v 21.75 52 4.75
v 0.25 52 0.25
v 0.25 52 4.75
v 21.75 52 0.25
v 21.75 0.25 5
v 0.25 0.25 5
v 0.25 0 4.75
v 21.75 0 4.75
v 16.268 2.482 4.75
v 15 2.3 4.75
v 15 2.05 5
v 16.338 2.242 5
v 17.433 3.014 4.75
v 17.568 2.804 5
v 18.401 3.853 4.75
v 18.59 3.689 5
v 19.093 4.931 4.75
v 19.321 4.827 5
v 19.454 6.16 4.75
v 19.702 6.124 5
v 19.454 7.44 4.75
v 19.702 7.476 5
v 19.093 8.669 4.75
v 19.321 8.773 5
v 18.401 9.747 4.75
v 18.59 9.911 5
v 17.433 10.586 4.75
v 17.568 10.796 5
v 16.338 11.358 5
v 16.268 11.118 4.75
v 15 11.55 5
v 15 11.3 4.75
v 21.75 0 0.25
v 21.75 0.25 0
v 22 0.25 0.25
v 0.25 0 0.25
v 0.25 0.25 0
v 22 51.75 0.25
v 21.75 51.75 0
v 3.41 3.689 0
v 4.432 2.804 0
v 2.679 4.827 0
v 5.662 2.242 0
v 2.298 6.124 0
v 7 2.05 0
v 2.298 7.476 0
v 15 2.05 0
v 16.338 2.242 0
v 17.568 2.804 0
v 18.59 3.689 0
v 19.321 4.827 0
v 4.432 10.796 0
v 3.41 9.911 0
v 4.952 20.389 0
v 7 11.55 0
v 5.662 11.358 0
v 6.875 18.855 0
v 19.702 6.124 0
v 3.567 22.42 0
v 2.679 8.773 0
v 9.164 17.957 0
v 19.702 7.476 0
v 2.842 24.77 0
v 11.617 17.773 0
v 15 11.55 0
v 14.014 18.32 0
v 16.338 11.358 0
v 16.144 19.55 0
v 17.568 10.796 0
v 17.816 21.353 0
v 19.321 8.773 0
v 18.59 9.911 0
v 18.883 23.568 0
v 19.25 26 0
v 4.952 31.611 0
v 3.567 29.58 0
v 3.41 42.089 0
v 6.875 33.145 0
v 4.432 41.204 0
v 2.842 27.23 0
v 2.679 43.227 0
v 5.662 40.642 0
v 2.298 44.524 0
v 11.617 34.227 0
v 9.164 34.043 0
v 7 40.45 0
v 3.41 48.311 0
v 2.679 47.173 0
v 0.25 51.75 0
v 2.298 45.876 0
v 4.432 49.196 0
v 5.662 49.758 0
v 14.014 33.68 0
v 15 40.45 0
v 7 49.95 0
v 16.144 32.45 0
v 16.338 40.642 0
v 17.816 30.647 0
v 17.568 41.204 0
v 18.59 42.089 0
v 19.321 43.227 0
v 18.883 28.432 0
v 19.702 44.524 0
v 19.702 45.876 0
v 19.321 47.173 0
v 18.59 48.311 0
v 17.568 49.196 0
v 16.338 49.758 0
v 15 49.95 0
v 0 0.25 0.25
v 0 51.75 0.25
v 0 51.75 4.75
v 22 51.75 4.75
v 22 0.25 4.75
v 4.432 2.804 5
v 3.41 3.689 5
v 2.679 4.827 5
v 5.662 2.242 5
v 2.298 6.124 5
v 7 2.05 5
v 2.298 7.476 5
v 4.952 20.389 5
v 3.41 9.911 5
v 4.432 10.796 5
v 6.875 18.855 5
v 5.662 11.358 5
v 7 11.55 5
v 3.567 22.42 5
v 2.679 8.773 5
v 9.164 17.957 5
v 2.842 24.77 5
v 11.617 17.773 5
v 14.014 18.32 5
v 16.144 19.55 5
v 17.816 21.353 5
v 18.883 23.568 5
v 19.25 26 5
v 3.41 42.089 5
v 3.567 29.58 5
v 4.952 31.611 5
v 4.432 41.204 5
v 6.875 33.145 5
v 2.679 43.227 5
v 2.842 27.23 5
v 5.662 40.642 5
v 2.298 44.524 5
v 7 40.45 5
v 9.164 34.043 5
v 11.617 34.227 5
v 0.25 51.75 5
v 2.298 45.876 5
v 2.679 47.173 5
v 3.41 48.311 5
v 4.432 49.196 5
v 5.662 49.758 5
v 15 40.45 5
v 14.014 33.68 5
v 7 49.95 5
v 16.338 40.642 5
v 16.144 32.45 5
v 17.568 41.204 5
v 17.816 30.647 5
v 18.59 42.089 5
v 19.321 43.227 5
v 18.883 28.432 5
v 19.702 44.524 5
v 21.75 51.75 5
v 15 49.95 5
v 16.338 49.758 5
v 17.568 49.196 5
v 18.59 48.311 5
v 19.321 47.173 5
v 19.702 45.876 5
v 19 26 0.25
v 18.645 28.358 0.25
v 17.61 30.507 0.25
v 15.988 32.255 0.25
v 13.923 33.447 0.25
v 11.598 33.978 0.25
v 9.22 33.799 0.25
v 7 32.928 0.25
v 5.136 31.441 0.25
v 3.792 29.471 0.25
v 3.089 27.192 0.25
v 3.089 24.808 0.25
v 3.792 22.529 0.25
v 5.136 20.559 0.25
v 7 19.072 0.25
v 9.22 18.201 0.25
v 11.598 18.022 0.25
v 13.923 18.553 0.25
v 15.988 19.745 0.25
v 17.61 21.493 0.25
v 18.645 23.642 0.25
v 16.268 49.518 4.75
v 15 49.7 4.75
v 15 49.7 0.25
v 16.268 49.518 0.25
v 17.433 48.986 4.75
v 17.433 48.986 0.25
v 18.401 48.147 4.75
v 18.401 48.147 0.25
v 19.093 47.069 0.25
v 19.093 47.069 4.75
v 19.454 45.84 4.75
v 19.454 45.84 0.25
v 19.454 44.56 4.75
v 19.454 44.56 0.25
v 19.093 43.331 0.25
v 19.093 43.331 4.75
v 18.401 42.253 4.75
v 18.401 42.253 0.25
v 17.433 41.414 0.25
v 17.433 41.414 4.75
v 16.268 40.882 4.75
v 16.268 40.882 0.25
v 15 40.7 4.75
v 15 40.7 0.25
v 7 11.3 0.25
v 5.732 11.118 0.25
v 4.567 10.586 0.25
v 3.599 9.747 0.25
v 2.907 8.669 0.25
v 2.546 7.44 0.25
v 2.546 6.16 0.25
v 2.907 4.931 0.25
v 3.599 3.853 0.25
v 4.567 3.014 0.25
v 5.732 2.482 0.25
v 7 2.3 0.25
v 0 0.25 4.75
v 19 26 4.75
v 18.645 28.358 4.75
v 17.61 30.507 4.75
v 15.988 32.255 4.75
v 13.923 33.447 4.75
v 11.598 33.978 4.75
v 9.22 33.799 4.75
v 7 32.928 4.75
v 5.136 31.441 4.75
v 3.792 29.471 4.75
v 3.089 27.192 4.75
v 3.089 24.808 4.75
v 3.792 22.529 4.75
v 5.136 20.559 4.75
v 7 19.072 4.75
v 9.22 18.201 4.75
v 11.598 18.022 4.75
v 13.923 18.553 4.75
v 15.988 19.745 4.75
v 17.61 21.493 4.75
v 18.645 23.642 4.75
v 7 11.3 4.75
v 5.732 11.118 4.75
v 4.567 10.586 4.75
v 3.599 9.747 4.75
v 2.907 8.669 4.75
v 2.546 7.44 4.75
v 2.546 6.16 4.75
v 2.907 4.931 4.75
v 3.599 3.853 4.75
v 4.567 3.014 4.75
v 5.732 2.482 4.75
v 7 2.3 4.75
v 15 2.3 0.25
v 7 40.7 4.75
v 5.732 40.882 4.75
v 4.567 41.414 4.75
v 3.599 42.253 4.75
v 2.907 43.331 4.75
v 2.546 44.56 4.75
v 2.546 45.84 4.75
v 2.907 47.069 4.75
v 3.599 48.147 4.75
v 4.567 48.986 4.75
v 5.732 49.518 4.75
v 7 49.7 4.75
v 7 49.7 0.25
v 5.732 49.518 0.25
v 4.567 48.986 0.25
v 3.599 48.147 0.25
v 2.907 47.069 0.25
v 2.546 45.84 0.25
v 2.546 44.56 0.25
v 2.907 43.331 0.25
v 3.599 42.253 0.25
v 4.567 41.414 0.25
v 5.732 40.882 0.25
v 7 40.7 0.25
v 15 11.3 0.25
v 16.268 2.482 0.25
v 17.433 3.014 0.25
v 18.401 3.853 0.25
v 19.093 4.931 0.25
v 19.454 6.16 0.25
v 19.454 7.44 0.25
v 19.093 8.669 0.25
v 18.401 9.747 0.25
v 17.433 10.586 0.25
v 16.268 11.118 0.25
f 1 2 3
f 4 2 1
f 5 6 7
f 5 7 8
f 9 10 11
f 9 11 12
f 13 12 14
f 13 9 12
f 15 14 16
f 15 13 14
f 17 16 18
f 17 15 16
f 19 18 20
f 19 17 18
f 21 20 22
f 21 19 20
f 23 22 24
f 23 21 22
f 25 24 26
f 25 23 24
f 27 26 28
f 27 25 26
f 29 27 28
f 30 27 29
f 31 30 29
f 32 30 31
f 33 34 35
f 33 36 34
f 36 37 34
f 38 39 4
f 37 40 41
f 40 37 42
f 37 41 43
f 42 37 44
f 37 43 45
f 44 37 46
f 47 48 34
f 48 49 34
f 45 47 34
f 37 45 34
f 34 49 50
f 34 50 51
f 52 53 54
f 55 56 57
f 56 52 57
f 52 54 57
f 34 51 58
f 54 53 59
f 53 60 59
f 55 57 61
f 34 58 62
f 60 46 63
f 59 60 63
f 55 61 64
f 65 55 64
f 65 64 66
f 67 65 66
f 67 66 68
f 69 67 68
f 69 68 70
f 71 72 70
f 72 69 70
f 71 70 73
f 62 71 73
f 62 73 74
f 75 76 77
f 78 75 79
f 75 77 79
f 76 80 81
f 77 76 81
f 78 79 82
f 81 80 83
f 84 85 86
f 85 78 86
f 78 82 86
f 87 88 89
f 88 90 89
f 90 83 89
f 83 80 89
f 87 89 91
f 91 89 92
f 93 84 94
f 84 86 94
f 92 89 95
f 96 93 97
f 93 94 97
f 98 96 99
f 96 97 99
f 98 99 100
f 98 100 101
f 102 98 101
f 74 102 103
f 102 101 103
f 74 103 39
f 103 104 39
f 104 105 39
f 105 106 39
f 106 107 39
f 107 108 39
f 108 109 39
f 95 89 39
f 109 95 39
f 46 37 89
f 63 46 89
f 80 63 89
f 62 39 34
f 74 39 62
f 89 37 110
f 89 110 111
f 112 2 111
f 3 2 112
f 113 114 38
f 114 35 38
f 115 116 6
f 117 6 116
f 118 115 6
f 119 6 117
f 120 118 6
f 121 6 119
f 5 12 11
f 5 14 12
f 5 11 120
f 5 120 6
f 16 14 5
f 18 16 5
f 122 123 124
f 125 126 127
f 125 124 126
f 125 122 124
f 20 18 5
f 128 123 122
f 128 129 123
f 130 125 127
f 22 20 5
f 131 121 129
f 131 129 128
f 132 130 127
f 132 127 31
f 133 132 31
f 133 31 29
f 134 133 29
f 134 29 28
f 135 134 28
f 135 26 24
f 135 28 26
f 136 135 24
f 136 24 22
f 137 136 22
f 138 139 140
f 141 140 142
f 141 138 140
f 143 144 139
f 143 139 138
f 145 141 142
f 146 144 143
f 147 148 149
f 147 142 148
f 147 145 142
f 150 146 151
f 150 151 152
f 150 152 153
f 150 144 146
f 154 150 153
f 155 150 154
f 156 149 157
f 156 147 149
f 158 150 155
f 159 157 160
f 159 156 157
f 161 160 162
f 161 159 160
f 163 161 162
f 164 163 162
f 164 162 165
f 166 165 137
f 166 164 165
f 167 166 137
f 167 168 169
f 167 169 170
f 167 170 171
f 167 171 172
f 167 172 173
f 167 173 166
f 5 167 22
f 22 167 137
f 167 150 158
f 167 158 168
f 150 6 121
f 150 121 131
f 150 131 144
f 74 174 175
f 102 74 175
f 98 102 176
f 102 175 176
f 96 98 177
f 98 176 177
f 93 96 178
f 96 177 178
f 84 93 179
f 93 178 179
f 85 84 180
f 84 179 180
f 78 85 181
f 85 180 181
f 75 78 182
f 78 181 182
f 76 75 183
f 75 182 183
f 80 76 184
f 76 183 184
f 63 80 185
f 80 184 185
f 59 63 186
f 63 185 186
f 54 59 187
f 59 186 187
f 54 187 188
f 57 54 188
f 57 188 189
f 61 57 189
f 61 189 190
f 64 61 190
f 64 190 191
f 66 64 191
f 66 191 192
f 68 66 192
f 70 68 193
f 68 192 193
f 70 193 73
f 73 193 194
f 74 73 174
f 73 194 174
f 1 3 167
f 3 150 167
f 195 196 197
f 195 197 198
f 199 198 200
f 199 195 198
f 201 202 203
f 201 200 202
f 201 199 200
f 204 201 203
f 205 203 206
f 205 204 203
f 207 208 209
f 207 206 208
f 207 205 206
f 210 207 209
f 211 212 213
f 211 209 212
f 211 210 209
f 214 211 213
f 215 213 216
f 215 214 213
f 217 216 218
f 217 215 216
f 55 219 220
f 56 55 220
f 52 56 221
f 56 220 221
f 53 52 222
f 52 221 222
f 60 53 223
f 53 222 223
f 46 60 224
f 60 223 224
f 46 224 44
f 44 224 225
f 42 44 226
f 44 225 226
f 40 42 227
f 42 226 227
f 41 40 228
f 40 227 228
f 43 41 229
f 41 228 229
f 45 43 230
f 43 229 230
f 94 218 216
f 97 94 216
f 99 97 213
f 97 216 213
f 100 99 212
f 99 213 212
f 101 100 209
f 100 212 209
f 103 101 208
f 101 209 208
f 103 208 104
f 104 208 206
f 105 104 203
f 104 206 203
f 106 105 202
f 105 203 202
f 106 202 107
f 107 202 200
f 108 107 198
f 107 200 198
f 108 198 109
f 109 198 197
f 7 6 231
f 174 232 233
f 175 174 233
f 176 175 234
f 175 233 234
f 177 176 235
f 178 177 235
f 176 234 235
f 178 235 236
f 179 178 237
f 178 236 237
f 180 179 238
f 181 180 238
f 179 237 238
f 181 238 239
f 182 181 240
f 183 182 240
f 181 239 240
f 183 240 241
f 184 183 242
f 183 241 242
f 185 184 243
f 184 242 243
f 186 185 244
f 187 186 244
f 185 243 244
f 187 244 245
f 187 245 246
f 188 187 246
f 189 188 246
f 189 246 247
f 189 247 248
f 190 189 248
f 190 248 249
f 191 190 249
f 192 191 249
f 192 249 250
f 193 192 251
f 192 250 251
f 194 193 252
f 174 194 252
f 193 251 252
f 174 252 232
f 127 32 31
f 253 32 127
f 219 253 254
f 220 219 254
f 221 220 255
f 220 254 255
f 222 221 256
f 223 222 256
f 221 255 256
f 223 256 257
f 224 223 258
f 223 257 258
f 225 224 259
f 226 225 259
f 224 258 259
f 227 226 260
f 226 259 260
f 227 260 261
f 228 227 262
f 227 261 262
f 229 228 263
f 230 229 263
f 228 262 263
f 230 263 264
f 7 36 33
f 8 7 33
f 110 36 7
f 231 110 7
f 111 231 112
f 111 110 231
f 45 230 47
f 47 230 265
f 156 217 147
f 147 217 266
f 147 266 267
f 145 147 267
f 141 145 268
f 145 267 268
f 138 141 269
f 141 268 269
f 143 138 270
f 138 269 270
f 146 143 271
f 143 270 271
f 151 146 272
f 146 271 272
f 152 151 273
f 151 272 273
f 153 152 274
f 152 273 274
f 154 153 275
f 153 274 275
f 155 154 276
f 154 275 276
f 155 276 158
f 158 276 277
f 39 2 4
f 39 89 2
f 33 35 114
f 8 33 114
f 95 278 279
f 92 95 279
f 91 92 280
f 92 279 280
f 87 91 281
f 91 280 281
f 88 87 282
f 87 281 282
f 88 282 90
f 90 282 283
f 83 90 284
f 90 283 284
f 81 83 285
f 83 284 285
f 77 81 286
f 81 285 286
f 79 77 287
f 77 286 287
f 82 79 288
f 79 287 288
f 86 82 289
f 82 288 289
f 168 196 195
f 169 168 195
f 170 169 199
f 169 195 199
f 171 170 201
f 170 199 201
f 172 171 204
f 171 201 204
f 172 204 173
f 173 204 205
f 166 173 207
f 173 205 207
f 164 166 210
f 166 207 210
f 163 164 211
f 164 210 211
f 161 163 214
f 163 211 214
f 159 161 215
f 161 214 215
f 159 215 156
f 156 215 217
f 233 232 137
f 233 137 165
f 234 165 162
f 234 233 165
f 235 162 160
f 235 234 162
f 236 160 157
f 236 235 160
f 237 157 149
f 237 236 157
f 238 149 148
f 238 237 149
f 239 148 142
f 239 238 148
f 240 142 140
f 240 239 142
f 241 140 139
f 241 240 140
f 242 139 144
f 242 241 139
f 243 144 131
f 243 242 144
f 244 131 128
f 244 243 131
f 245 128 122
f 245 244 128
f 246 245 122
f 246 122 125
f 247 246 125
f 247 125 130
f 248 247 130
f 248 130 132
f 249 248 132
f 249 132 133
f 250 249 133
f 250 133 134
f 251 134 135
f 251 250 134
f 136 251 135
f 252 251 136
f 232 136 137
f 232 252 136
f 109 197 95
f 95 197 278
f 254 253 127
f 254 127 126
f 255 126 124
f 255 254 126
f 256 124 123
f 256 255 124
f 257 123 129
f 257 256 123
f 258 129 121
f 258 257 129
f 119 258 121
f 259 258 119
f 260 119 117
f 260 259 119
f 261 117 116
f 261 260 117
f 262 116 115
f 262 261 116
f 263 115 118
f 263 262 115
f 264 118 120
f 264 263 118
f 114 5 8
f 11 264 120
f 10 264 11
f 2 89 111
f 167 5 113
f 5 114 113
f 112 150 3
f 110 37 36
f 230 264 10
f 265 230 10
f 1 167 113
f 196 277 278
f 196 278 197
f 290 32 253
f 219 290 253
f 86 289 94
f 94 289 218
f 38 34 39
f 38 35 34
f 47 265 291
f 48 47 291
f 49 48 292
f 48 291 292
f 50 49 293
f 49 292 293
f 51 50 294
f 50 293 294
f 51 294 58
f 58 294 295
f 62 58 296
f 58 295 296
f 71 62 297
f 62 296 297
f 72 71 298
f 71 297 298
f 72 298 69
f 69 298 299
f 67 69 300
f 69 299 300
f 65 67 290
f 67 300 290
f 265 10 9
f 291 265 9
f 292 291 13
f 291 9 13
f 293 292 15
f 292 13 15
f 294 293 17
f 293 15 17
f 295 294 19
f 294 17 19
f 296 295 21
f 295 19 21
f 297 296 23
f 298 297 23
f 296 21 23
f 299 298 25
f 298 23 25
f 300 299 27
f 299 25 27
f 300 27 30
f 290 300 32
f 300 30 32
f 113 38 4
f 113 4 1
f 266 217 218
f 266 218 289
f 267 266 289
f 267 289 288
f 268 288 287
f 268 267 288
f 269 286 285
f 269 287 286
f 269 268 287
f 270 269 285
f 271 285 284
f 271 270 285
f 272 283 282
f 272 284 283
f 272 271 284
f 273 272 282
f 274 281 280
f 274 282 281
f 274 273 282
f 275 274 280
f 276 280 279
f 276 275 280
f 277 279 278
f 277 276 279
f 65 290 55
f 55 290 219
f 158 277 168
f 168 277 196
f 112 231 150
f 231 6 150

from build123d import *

# Parameters (mm, degrees)
ESQUISSE1_W             = 22
ESQUISSE1_H             = 52
BOSS_EXTRU_1_DEPTH      = 5
ESQUISSE5_R             = 8
ENL_V_MAT_EXTRU_2_DEPTH = 5
ENL_V_MAT_EXTRU_3_DEPTH = 57.683330883
CHANFREIN1_SIZE         = 0.25


with BuildPart() as part:
    # Esquisse1 → Boss.-Extru.1 (new body)
    with BuildSketch(Plane.XY):
        with Locations((11, 26)):
            Rectangle(ESQUISSE1_W, ESQUISSE1_H)
    extrude(amount=BOSS_EXTRU_1_DEPTH)

    # Esquisse5 → Enlèv. mat.-Extru.2 (cut)
    with BuildSketch(Plane.XY.offset(5)):
        with Locations((11, 26)):
            Circle(ESQUISSE5_R)
    extrude(amount=-ENL_V_MAT_EXTRU_2_DEPTH, mode=Mode.SUBTRACT)

    # Esquisse6 → Enlèv. mat.-Extru.3 (cut, through all)
    with BuildSketch(Plane.XY.offset(5)):
        with BuildLine():
            Line((7, 49.7), (15, 49.7))
            ThreePointArc((15, 49.7), (19.5, 45.2), (15, 40.7))
            Line((15, 40.7), (7, 40.7))
            ThreePointArc((7, 40.7), (2.5, 45.2), (7, 49.7))
        make_face()
        with BuildLine():
            Line((7, 2.3), (15, 2.3))
            ThreePointArc((15, 2.3), (19.5, 6.8), (15, 11.3))
            Line((15, 11.3), (7, 11.3))
            ThreePointArc((7, 11.3), (2.5, 6.8), (7, 2.3))
        make_face()
    extrude(amount=-ENL_V_MAT_EXTRU_3_DEPTH, mode=Mode.SUBTRACT)

    # Chanfrein1
    chanfrein1_edges = [part.edges().sort_by_distance(p)[0] for p in [
        (22, 26, 5),
        (11, 52, 5),
        (3, 26, 0),
        (3, 26, 5),
        (2.5, 45.2, 0),
        (11, 49.7, 0),
        (19.5, 45.2, 0),
        (11, 40.7, 0),
        (2.5, 45.2, 5),
        (11, 40.7, 5),
        (19.5, 45.2, 5),
        (11, 49.7, 5),
        (2.5, 6.8, 0),
        (11, 11.3, 0),
        (19.5, 6.8, 0),
        (11, 2.3, 0),
        (2.5, 6.8, 5),
        (11, 2.3, 5),
        (19.5, 6.8, 5),
        (11, 11.3, 5),
        (0, 26, 5),
        (11, 52, 0),
        (22, 26, 0),
        (11, 0, 0),
        (0, 26, 0),
        (11, 0, 5),
        (0, 52, 2.5),
        (22, 52, 2.5),
        (22, 0, 2.5),
        (0, 0, 2.5),
    ]]
    chamfer(chanfrein1_edges, length=CHANFREIN1_SIZE)


solid = part.part
